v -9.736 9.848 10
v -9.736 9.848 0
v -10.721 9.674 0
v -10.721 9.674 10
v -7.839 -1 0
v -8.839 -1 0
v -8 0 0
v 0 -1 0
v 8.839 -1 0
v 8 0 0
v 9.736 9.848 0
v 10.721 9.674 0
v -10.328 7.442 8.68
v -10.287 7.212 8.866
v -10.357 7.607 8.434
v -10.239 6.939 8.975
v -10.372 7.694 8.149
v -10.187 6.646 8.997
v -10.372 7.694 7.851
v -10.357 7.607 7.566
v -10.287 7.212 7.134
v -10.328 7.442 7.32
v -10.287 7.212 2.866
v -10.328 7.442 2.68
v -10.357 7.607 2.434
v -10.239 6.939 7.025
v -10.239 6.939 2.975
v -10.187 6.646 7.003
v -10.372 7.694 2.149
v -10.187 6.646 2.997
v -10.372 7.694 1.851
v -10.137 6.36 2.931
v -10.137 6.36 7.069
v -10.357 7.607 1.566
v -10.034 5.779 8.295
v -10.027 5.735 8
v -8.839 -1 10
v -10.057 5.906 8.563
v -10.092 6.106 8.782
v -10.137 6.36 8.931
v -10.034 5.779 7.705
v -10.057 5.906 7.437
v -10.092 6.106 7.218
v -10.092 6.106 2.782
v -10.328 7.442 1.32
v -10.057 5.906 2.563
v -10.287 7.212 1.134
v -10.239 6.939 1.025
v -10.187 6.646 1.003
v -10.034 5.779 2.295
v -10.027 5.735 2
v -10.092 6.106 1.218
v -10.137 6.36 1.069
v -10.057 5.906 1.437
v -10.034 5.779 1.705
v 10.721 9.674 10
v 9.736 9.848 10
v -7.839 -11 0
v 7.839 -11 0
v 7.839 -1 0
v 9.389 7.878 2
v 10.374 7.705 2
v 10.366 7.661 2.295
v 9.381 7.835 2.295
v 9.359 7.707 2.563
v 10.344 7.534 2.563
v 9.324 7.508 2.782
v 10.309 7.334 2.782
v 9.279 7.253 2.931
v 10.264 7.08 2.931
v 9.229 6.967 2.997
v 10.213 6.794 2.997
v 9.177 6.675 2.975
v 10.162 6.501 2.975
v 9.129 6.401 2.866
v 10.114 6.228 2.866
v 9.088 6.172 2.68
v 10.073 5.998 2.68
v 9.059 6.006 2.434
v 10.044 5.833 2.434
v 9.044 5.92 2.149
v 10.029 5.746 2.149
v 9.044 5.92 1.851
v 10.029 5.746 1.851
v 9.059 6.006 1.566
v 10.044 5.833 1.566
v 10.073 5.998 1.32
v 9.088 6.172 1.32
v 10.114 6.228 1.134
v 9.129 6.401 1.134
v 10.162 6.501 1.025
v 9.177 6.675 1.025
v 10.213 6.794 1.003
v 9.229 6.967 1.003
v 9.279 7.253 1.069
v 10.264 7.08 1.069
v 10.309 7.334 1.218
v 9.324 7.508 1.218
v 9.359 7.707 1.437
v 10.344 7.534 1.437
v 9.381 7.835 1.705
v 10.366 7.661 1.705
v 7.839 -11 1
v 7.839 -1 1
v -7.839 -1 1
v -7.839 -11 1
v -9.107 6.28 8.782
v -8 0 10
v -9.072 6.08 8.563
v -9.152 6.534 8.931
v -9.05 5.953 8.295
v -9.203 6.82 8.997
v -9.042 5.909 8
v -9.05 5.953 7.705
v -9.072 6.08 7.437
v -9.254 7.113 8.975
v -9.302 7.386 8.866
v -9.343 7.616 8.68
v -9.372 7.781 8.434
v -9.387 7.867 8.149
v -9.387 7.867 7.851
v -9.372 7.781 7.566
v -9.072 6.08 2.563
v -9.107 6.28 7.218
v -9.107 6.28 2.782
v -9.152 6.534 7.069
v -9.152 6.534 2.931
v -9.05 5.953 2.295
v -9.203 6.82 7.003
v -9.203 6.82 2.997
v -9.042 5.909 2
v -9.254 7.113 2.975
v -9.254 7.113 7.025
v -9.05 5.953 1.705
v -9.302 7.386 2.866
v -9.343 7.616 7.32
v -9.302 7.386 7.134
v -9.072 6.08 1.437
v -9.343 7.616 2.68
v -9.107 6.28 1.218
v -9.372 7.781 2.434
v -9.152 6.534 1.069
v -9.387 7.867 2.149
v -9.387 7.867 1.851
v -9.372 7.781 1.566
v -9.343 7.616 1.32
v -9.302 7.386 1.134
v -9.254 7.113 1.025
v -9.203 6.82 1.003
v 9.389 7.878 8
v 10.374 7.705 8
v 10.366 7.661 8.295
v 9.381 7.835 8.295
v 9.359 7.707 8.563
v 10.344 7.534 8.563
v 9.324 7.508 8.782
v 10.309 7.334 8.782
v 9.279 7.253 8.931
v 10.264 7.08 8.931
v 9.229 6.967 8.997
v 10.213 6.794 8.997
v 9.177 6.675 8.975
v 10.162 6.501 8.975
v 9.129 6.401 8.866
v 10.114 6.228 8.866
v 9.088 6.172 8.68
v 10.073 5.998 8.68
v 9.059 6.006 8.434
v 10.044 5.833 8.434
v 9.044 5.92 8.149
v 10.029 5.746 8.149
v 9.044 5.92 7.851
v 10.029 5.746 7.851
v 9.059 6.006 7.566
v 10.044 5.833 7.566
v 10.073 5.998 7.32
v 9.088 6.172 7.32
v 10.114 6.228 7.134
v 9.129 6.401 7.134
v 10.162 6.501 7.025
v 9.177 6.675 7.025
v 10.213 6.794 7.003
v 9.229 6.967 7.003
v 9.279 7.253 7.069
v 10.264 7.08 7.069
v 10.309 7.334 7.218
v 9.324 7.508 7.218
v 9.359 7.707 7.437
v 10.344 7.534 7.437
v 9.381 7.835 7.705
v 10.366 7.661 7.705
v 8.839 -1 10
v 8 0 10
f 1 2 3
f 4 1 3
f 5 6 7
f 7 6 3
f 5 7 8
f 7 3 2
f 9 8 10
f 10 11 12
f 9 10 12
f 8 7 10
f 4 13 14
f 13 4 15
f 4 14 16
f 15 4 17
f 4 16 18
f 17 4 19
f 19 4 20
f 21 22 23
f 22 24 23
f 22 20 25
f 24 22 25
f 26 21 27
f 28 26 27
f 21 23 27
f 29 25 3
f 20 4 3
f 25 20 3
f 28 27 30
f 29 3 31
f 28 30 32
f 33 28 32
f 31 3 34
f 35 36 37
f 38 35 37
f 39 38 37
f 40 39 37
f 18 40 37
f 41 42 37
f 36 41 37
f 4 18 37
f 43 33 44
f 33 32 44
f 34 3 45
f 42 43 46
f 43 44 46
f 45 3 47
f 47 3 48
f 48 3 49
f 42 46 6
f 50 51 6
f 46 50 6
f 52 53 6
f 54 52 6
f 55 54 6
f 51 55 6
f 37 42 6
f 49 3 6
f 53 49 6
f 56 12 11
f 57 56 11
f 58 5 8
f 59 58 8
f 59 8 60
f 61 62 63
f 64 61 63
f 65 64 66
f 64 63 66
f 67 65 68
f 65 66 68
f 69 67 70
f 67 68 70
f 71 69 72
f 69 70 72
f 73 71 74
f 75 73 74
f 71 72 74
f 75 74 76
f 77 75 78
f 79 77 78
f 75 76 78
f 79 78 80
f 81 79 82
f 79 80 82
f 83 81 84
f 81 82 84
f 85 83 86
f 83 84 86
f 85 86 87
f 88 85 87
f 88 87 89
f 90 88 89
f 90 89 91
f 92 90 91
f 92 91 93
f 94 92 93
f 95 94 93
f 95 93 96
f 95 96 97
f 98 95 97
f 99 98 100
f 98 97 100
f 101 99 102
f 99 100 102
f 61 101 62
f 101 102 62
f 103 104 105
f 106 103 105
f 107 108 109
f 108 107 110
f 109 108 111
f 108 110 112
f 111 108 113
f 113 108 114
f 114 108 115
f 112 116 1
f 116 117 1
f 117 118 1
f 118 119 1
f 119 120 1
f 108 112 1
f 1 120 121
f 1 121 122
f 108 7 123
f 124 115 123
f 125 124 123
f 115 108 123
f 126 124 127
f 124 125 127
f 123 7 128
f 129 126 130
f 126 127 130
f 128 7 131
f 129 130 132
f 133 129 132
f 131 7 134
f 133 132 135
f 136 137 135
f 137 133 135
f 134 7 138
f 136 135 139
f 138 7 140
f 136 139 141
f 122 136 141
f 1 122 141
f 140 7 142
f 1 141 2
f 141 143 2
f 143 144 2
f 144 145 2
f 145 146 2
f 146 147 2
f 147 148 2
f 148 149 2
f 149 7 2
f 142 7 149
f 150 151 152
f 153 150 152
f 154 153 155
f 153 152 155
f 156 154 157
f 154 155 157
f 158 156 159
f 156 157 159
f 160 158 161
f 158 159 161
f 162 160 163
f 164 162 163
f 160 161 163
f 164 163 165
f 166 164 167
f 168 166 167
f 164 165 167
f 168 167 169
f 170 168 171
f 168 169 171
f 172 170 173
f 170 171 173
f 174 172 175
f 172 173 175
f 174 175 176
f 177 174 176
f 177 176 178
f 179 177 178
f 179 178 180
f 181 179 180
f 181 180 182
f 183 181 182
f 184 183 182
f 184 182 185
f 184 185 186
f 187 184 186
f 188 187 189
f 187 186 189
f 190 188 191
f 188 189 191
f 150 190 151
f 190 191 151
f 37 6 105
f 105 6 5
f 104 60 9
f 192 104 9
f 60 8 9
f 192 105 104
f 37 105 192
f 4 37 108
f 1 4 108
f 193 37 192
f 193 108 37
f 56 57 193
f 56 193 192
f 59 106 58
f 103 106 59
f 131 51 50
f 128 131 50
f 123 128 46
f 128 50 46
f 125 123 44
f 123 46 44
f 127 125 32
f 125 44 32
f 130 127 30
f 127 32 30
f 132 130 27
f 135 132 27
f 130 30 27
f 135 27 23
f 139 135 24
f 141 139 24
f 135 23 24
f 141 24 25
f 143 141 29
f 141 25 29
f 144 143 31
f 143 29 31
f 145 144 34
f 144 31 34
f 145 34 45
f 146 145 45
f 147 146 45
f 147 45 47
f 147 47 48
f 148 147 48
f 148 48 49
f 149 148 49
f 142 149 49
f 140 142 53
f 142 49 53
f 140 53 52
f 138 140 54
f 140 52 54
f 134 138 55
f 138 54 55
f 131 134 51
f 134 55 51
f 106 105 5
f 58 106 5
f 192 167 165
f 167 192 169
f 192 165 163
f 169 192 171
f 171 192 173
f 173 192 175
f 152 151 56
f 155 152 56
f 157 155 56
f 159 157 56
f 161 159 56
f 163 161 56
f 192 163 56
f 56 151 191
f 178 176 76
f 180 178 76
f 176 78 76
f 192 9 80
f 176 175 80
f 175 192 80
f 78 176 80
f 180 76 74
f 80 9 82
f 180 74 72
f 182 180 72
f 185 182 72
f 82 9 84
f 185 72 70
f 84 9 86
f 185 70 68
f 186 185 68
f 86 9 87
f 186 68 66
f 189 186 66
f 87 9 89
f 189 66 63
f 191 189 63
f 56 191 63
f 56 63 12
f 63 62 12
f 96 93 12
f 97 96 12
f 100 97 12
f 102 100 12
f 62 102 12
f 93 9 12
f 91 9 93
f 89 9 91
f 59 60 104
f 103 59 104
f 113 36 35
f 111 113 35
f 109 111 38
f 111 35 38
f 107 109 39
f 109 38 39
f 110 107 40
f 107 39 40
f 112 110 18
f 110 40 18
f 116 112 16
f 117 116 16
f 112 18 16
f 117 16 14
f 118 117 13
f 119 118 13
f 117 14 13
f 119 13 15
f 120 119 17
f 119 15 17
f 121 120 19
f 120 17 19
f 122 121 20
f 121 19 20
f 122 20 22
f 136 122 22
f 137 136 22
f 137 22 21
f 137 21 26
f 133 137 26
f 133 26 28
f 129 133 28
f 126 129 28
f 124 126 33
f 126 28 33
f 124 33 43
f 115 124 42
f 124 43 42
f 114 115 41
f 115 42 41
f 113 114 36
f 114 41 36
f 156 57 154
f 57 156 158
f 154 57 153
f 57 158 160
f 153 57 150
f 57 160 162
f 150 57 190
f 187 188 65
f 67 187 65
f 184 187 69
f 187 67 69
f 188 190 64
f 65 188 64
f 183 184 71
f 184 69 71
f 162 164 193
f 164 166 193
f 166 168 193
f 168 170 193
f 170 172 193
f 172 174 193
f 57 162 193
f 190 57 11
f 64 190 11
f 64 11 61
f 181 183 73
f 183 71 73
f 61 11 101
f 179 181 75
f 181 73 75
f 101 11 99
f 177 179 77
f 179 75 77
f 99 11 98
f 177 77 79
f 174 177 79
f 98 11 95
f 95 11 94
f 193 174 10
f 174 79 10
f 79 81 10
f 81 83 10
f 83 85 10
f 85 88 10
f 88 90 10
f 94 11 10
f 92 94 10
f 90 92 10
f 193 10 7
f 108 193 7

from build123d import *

# Parameters (mm, degrees)
F1_DEPTH = 10
F2_R     = 1
F3_DEPTH = 1
F4_R     = 1
F5_DEPTH = 1
F7_DEPTH = 10


with BuildPart() as f1:
    # F0 (on Top) → F1 (new body)
    with BuildSketch(Plane.XY):
        Polygon((8, 0), (0, 0), (-8, 0), (-9.7364817767, 9.8480775301), (-10.7212895297, 9.6744293525), (-8.8390996312, -1), (0, -1), (8.8390996312, -1), (10.7212895297, 9.6744293525), (9.7364817767, 9.8480775301), align=None)
    extrude(amount=F1_DEPTH)

    # F2 (on face) → F3 (cut, through all)
    with BuildSketch(Plane(origin=(-8.7435782362, -1.541728751, 0), x_dir=(0.1736481777, -0.984807753, 0), z_dir=(-0.984807753, -0.1736481777, 0))):
        with Locations((-8.3891854213, 8)):
            Circle(F2_R)
        with Locations((-8.3891854213, 2)):
            Circle(F2_R)
    extrude(amount=-F3_DEPTH, mode=Mode.SUBTRACT)

    # F4 (on face) → F5 (cut, through all)
    with BuildSketch(Plane(origin=(8.7435782362, -1.541728751, 0), x_dir=(0.1736481777, 0.984807753, 0), z_dir=(0.984807753, -0.1736481777, 0))):
        with Locations((8.3891854213, 8)):
            Circle(F4_R)
        with Locations((8.3891854213, 2)):
            Circle(F4_R)
    extrude(amount=-F5_DEPTH, mode=Mode.SUBTRACT)

    # F6 (on face) → F7 (join)
    with BuildSketch(Plane.XZ.offset(1)):
        Polygon((7.8390996312, 1.3758e-06), (7.8390996312, 1.0000013758), (-7.8390996312, 0.9999986242), (-7.8390996312, -1.3758e-06), align=None)
    extrude(amount=F7_DEPTH)


solid = f1.part
